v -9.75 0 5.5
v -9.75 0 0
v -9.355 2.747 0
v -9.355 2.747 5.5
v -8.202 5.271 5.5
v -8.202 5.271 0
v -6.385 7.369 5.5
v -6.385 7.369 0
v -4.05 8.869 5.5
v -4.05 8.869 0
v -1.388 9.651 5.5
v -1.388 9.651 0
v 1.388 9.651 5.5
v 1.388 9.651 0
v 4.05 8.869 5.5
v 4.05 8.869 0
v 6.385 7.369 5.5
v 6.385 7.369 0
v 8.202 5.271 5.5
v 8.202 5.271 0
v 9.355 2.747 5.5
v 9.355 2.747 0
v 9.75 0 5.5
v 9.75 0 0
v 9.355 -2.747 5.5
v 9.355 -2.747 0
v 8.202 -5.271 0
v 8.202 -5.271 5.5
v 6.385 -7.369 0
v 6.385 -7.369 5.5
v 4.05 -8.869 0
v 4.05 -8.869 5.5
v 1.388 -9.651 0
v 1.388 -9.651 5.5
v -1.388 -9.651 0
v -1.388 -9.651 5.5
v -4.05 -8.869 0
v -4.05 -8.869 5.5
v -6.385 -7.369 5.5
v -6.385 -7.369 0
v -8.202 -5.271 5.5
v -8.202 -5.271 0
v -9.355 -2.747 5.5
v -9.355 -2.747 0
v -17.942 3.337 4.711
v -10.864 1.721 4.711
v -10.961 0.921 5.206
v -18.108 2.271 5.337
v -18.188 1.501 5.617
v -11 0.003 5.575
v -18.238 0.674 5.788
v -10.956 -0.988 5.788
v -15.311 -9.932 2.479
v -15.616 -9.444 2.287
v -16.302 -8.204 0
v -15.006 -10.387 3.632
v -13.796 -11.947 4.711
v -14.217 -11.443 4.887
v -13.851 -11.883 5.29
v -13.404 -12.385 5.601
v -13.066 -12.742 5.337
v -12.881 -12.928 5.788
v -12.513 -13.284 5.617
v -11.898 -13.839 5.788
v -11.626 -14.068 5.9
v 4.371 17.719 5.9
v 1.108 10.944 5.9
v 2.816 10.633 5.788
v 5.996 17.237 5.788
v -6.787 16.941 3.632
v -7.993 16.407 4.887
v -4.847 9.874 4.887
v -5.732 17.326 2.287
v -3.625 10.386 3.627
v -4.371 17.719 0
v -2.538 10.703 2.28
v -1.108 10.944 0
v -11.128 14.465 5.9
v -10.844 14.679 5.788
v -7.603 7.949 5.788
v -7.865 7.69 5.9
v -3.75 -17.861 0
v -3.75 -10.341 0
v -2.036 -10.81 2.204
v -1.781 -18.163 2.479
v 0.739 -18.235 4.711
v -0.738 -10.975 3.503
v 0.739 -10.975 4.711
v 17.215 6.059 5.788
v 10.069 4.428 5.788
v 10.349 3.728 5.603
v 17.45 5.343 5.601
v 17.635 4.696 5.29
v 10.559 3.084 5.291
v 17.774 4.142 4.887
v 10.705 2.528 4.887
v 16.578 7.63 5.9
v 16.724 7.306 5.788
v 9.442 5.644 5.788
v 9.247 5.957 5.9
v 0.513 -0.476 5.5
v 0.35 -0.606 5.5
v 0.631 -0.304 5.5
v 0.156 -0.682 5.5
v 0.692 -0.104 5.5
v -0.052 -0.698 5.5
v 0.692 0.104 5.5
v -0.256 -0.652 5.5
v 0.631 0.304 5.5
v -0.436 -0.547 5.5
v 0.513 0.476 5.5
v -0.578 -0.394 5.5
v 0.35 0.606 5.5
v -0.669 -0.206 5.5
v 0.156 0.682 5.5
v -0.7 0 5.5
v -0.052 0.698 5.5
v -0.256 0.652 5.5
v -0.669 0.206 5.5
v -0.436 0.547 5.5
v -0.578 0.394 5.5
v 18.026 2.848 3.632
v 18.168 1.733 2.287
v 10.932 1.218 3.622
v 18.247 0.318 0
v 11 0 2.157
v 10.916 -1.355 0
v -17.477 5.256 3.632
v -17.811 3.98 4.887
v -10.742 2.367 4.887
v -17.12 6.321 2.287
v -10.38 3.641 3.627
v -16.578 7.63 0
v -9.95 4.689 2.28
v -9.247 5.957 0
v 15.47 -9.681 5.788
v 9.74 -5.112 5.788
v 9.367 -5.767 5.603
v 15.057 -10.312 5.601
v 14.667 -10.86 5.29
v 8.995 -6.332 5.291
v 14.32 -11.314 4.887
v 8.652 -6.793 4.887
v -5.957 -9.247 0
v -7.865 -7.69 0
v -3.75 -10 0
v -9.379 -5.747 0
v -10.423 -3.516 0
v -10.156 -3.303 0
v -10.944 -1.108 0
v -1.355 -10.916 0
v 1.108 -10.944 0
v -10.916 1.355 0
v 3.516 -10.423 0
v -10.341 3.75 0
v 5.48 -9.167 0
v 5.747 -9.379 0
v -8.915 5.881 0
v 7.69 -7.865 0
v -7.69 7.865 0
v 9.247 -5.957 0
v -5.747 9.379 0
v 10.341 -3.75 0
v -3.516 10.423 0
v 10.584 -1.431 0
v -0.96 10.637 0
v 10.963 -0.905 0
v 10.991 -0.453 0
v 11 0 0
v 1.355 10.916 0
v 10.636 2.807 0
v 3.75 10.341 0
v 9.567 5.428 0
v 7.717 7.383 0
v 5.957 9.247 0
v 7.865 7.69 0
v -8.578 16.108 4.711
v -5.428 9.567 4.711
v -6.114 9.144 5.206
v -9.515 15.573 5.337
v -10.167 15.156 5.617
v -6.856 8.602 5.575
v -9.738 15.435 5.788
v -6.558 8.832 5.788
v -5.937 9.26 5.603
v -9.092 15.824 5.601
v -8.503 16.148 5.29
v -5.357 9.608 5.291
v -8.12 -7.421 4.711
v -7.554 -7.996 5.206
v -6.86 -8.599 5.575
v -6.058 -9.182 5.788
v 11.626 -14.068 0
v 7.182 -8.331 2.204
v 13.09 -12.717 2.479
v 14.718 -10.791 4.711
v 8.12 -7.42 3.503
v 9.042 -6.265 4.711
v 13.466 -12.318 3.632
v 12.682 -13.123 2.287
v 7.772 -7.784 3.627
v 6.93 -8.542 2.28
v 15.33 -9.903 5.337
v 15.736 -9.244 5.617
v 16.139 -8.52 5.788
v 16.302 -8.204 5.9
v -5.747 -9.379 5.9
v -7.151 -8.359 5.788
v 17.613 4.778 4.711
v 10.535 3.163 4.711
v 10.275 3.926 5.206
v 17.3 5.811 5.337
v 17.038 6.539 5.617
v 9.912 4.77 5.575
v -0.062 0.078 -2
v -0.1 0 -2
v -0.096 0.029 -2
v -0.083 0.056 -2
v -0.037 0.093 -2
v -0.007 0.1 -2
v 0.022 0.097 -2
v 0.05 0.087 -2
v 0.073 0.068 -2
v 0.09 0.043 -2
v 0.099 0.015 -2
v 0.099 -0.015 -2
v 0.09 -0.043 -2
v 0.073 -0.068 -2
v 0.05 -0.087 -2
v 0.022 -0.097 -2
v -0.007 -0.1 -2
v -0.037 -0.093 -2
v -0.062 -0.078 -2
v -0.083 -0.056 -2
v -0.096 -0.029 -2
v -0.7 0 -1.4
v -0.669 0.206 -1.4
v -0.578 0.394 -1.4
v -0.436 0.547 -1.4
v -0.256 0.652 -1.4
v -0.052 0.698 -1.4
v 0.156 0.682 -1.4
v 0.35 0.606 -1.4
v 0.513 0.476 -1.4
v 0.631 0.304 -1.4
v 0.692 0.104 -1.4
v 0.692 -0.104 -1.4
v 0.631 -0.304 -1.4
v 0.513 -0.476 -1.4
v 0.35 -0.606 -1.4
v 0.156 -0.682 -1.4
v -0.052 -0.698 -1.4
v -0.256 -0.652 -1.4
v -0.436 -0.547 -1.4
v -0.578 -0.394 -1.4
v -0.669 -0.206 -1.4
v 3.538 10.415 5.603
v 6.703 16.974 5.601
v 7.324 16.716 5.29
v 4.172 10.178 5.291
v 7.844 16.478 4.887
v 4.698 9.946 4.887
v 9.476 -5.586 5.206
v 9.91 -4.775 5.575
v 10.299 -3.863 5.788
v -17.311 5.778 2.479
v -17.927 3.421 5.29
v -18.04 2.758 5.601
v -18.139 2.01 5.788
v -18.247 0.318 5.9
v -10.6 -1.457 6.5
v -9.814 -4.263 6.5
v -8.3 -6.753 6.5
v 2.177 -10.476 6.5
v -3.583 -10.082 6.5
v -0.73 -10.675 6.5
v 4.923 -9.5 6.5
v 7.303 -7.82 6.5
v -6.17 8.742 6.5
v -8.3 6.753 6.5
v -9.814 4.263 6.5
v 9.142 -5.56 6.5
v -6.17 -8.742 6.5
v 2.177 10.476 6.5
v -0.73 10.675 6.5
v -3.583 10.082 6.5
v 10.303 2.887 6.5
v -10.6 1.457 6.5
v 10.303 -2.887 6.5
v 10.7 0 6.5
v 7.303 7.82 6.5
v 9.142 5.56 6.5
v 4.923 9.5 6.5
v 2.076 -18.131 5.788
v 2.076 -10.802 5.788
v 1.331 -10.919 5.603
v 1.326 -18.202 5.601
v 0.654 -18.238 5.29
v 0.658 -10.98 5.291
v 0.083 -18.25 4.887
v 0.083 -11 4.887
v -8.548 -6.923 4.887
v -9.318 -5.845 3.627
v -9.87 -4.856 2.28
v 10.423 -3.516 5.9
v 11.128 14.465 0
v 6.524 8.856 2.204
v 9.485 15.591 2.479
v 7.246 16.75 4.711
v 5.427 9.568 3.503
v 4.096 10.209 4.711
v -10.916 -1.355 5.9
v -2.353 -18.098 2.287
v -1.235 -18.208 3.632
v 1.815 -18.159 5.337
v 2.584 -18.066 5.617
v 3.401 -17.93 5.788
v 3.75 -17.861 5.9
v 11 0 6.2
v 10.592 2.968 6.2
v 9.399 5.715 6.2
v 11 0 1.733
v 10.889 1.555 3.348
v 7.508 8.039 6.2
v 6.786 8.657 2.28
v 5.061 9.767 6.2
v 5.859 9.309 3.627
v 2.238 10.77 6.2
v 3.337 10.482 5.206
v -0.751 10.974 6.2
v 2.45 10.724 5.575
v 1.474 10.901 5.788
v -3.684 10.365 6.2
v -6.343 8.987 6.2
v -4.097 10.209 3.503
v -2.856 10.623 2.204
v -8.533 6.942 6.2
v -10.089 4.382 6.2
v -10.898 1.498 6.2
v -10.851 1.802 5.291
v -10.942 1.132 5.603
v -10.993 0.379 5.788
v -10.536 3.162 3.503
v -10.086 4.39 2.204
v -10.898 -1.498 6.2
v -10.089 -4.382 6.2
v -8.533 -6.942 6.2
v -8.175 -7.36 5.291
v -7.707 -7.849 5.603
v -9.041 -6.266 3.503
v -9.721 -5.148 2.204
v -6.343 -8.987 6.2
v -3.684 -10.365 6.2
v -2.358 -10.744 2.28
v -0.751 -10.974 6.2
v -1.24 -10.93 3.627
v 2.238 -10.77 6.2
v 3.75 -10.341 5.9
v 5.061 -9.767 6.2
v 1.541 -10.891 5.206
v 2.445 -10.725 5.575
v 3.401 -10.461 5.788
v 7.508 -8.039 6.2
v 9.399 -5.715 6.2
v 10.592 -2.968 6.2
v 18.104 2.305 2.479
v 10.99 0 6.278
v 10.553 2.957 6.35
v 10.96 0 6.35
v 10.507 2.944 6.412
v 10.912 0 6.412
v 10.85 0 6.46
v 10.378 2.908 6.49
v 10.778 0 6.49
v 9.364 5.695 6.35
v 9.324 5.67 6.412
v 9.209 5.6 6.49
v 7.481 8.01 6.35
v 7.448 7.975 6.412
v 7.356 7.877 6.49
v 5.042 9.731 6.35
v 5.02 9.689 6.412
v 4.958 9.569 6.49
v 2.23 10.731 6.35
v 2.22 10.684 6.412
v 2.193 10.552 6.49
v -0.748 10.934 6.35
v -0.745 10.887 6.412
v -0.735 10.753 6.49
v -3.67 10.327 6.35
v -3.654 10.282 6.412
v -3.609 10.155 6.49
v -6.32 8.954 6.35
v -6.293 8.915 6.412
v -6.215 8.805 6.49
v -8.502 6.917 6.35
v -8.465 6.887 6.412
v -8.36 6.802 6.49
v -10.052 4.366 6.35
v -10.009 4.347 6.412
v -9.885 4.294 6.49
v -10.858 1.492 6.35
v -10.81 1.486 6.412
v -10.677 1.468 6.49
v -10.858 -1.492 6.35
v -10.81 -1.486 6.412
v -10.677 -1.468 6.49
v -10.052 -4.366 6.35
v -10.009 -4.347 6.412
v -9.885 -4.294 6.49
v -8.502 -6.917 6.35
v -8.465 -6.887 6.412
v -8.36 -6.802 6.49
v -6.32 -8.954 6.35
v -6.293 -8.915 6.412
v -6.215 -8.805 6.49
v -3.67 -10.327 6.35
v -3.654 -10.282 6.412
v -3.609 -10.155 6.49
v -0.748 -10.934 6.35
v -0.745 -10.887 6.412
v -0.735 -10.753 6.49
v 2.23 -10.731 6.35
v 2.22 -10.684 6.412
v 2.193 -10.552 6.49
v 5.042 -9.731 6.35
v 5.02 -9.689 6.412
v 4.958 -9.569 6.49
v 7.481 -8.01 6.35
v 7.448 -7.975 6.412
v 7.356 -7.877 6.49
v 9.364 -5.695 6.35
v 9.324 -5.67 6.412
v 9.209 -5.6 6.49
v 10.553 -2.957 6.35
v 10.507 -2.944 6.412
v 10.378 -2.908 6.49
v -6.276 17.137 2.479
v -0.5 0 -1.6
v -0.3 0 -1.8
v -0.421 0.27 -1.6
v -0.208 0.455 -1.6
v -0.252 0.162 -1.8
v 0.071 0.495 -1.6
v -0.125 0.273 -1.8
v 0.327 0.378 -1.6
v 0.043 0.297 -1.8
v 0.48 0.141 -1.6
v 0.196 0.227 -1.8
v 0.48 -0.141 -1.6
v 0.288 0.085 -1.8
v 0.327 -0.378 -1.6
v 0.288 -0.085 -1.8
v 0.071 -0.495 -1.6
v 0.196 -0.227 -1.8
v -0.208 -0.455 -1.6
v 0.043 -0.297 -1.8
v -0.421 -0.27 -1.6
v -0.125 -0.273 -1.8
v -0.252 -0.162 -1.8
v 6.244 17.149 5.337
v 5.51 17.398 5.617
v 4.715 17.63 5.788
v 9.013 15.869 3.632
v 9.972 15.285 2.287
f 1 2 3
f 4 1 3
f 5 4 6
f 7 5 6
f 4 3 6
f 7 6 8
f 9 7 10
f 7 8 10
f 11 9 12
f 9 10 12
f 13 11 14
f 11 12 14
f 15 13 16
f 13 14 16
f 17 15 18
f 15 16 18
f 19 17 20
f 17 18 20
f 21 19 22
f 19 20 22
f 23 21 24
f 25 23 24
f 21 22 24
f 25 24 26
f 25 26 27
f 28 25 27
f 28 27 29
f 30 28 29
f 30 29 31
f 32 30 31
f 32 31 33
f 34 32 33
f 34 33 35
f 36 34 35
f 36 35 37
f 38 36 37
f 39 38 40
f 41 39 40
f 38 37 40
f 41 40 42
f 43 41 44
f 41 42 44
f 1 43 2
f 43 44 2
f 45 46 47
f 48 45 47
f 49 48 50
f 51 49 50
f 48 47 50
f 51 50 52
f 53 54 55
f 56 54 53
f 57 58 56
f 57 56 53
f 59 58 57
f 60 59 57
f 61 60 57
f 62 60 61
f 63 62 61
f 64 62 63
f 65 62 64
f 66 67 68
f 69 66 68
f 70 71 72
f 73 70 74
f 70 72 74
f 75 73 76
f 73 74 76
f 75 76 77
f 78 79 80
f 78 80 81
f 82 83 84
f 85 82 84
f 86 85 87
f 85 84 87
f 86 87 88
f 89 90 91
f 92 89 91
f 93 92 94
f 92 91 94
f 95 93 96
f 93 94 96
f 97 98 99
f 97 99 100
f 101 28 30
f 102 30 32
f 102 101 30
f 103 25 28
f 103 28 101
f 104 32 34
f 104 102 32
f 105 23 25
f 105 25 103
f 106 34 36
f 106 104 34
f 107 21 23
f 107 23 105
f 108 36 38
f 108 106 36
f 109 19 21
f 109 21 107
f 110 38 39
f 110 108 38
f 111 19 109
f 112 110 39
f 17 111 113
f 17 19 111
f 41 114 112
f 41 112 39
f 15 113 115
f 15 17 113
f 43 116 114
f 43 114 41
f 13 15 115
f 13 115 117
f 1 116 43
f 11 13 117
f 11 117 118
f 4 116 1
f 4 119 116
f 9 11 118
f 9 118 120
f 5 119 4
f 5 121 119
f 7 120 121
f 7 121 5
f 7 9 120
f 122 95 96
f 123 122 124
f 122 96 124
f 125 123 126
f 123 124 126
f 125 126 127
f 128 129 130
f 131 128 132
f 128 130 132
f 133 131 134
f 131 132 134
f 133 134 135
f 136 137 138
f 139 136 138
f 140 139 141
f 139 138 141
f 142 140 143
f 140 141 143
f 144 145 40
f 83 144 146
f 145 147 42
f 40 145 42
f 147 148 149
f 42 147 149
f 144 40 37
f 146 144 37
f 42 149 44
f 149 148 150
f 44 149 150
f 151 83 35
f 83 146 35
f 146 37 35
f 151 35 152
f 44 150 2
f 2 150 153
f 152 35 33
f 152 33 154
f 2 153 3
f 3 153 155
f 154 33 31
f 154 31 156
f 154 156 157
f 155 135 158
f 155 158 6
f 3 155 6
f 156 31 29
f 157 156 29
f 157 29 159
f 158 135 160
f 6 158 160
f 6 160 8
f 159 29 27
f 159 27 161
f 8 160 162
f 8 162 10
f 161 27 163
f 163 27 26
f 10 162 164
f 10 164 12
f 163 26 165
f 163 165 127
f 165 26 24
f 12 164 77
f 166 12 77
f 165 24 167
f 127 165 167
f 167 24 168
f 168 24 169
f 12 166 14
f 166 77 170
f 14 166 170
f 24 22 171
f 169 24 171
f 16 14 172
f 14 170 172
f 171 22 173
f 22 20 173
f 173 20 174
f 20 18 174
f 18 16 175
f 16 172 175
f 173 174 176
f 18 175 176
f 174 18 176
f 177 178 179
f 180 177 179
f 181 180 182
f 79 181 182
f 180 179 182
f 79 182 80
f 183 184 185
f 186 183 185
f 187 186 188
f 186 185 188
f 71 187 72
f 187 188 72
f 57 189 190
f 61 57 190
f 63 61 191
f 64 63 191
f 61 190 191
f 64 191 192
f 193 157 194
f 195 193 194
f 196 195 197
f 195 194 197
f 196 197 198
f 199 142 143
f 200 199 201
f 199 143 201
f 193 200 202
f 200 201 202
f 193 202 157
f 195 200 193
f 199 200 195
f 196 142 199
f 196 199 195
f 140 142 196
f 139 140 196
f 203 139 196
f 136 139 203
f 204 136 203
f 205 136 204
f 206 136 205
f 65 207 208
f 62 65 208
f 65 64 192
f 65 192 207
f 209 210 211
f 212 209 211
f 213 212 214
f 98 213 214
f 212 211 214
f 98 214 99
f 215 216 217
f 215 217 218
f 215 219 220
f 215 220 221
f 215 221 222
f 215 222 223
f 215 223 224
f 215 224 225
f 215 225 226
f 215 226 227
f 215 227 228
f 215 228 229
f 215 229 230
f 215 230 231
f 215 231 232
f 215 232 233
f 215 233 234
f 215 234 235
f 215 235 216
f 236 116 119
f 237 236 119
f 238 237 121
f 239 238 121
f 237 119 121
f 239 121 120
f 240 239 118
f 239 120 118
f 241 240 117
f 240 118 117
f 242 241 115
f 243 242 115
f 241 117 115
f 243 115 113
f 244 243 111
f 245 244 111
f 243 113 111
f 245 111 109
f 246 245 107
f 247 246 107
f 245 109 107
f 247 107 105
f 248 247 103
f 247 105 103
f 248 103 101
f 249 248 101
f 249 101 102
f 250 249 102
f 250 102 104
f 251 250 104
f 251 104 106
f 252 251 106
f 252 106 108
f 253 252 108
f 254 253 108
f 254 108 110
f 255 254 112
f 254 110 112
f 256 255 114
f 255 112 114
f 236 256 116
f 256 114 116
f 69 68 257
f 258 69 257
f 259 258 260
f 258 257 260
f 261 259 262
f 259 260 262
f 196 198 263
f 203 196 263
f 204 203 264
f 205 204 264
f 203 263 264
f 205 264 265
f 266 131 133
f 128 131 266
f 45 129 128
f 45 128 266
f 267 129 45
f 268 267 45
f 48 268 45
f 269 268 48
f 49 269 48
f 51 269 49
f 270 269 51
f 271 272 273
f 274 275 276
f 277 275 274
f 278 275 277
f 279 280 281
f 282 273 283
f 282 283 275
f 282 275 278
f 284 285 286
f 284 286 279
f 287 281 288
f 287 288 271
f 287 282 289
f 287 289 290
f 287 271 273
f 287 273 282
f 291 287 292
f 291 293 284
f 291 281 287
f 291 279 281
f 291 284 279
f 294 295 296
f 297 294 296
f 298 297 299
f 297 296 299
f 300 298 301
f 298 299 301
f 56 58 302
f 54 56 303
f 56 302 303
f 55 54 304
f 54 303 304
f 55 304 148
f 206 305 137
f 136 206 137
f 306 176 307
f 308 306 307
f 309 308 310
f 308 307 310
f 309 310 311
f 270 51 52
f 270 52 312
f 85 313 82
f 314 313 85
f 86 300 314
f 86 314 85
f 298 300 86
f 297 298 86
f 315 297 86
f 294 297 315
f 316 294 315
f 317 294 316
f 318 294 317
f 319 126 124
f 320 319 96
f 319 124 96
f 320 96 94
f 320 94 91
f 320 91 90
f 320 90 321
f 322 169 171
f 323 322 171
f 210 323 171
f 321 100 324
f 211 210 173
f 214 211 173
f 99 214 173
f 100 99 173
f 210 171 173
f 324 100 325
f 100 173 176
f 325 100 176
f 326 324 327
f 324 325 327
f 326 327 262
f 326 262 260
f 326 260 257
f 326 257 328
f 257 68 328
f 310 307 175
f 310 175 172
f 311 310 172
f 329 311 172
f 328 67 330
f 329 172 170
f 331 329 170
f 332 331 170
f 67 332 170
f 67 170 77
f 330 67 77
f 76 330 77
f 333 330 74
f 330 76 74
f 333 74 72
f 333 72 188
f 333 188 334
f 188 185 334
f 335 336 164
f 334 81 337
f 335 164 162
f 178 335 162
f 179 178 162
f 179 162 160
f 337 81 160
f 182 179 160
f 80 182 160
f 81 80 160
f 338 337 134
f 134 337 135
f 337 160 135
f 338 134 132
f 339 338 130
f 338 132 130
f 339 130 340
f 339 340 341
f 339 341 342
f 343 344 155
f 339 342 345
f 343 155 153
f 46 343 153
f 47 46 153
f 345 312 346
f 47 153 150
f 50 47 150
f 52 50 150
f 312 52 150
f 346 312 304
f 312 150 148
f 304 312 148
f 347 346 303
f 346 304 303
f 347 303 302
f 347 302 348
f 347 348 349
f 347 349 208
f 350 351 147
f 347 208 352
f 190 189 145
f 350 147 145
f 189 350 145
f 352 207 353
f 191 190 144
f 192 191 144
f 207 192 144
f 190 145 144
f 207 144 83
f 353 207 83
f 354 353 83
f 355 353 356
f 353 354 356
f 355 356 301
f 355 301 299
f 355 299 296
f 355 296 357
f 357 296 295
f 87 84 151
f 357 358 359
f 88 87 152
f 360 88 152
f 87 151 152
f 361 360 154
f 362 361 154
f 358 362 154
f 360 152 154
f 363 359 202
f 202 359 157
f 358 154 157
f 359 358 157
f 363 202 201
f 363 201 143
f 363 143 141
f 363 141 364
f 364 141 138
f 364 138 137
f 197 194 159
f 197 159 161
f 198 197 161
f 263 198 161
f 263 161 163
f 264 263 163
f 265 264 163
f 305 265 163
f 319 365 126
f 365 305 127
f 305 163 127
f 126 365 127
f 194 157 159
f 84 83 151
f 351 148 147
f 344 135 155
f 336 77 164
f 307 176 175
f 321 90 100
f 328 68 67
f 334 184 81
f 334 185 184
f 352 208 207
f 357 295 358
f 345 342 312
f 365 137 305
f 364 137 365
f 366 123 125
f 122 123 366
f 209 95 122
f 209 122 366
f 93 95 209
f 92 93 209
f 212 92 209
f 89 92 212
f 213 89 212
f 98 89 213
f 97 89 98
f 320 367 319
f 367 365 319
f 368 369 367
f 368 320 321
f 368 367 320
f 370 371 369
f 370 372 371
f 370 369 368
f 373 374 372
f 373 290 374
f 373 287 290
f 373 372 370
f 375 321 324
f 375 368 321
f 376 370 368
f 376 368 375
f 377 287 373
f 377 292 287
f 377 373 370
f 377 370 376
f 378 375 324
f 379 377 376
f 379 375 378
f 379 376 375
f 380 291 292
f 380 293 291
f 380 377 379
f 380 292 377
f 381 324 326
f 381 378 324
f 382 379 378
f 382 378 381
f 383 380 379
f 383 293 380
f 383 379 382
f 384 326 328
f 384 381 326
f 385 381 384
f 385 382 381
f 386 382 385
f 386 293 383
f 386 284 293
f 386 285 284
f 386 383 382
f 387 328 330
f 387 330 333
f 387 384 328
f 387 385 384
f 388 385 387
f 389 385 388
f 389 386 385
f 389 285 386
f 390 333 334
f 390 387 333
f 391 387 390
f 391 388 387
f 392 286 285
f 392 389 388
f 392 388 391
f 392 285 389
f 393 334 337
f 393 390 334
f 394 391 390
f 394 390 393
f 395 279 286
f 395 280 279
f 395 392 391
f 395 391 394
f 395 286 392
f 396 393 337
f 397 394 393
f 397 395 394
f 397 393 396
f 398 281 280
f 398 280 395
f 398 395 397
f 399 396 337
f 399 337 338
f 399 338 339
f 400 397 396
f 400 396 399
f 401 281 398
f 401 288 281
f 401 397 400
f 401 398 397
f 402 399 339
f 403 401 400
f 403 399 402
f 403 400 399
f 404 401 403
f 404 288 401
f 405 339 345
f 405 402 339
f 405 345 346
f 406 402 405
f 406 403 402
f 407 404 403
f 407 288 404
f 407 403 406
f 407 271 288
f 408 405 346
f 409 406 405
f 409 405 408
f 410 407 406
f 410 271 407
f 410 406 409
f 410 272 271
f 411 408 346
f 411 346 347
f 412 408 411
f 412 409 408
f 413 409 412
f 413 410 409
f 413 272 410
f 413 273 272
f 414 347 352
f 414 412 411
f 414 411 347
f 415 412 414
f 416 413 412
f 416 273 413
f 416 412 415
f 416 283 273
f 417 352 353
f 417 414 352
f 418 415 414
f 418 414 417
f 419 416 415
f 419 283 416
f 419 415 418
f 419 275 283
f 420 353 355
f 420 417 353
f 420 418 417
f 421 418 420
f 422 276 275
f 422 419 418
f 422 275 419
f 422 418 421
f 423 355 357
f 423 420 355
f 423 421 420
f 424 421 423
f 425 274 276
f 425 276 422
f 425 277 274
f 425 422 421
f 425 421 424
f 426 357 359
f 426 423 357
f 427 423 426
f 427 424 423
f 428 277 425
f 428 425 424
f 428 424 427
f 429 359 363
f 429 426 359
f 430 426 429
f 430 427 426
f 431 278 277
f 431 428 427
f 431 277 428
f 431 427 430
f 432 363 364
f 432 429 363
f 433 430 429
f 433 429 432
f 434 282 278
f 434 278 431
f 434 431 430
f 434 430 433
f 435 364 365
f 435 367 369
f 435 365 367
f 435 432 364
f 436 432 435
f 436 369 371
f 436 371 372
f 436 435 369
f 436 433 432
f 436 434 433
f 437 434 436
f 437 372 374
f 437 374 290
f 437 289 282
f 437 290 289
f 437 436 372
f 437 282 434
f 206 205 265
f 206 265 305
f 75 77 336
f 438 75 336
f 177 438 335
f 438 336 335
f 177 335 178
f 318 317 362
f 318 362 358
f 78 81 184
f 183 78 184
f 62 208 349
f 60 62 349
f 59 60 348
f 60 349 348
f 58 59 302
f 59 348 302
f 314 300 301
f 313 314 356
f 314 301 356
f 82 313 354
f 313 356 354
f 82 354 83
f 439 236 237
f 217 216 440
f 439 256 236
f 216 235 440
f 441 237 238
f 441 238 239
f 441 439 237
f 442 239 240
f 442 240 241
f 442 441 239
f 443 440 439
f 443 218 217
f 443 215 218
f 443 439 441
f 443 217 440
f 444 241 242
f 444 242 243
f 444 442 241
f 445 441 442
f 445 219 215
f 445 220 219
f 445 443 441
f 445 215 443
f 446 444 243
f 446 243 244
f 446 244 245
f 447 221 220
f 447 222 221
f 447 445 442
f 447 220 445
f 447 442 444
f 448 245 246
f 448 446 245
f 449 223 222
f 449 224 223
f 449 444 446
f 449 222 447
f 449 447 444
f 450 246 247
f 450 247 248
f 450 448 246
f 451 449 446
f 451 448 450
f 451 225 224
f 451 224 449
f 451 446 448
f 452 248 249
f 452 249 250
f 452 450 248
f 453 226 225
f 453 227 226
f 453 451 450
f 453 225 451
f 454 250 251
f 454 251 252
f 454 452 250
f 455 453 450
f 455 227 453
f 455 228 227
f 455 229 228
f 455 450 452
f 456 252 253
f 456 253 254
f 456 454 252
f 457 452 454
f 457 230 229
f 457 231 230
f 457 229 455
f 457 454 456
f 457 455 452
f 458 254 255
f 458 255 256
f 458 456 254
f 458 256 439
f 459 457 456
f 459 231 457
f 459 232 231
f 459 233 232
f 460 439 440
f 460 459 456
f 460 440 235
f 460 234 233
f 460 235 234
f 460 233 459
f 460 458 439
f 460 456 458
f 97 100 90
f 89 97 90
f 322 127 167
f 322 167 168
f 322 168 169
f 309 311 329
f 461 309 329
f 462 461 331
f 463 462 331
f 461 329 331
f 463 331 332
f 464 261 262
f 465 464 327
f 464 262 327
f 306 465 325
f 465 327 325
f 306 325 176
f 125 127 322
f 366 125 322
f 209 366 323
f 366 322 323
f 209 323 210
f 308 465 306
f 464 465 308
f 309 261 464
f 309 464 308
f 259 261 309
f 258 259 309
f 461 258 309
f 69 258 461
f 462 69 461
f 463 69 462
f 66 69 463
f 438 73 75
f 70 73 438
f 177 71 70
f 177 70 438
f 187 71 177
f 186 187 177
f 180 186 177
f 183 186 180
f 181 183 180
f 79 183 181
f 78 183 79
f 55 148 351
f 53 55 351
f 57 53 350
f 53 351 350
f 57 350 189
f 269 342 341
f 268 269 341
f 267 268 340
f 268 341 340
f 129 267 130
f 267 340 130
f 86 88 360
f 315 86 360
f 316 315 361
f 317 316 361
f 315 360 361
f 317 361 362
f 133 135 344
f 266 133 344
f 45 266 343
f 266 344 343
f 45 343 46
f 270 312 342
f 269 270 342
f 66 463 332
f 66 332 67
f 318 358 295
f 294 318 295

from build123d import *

# Parameters (mm, degrees)
SKETCH_1_R               = 11
EXTRUDE_1_DEPTH          = 6.5
SKETCH_2_R               = 9.75
CUT_EXTRUDE_1_DEPTH      = 5.5
SKETCH_3_R               = 0.7
EXTRUDE_2_DEPTH          = 7.5
CHAMFER_1_SIZE           = 0.6
EXTRUDE_START            = -10
EXTRUDE_3_DEPTH          = 23
PATTERN_CIRCULAR_1_COUNT = 7
FILLET_1_R               = 0.3
SKETCH_5_OUTSIDE_W       = 86.532
SKETCH_5_OUTSIDE_H       = 84.877
SKETCH_5_OUTSIDE_R       = 18.25
CUT_EXTRUDE_2_DEPTH      = 23


with BuildPart() as part:
    # Эскиз1 → Бобышка-Вытянуть1 (new body)
    with BuildSketch(Plane.XY):
        Circle(SKETCH_1_R)
    extrude(amount=EXTRUDE_1_DEPTH)

    # Эскиз2 → Вырез-Вытянуть1 (cut)
    with BuildSketch(Plane(origin=(0, 0, 0), x_dir=(-1, 0, 0), z_dir=(0, 0, -1))):
        Circle(SKETCH_2_R)
    extrude(amount=-CUT_EXTRUDE_1_DEPTH, mode=Mode.SUBTRACT)

    # Эскиз3 → Бобышка-Вытянуть2 (add)
    with BuildSketch(Plane(origin=(0, 0, 5.5), x_dir=(-1, 0, 0), z_dir=(0, 0, -1))):
        Circle(SKETCH_3_R)
    extrude(amount=EXTRUDE_2_DEPTH)

    # Фаска1
    chamfer_1_edges = [part.edges().sort_by_distance(p)[0] for p in [
        (0.7, 0, -2),
    ]]
    chamfer(chamfer_1_edges, length=CHAMFER_1_SIZE)

    # Эскиз4 → Бобышка-Вытянуть3 (add)
    with BuildSketch(Plane(origin=(0, 0, 0), x_dir=(1, 0, 0), z_dir=(0, 1, 0)).offset(EXTRUDE_START)):
        with BuildLine():
            ThreePointArc((3.75, -5.9), (2.910954768, -5.877455841), (2.076425924, -5.787640746))
            ThreePointArc((2.076425924, -5.787640746), (1.016898237, -5.476222818), (0.082906283, -4.886952865))
            ThreePointArc((0.082906283, -4.886952865), (-2.084101368, -2.63998988), (-3.75, 0))
            ThreePointArc((-3.75, 0), (-1.712075741, -2.552424329), (0.739315837, -4.710822941))
            ThreePointArc((0.739315837, -4.710822941), (2.002660979, -5.416468702), (3.40130611, -5.787640746))
            ThreePointArc((3.40130611, -5.787640746), (3.575082247, -5.845591808), (3.75, -5.9))
        make_face()
    extrude_3 = extrude(amount=-EXTRUDE_3_DEPTH)

    # Круговой массив1: Бобышка-Вытянуть3 ×7 about axis
    pattern_circular_1_axis = Axis((0, 0, 6.5), (0, 0, -1))
    for i in range(1, PATTERN_CIRCULAR_1_COUNT):
        add(extrude_3.rotate(pattern_circular_1_axis, i * 360 / PATTERN_CIRCULAR_1_COUNT))

    # Скругление1
    fillet_1_edges = [part.edges().sort_by_distance(p)[0] for p in [
        (-11, 0, 6.5),
    ]]
    fillet(fillet_1_edges, radius=FILLET_1_R)

    # Эскиз5 outside → Вырез-Вытянуть2 (cut)
    with BuildSketch(Plane.XY.offset(6.5)):
        with Locations((0, -0.8205)):
            Rectangle(SKETCH_5_OUTSIDE_W, SKETCH_5_OUTSIDE_H)
        Circle(SKETCH_5_OUTSIDE_R, mode=Mode.SUBTRACT)
    extrude(amount=-CUT_EXTRUDE_2_DEPTH, mode=Mode.SUBTRACT)


solid = part.part
